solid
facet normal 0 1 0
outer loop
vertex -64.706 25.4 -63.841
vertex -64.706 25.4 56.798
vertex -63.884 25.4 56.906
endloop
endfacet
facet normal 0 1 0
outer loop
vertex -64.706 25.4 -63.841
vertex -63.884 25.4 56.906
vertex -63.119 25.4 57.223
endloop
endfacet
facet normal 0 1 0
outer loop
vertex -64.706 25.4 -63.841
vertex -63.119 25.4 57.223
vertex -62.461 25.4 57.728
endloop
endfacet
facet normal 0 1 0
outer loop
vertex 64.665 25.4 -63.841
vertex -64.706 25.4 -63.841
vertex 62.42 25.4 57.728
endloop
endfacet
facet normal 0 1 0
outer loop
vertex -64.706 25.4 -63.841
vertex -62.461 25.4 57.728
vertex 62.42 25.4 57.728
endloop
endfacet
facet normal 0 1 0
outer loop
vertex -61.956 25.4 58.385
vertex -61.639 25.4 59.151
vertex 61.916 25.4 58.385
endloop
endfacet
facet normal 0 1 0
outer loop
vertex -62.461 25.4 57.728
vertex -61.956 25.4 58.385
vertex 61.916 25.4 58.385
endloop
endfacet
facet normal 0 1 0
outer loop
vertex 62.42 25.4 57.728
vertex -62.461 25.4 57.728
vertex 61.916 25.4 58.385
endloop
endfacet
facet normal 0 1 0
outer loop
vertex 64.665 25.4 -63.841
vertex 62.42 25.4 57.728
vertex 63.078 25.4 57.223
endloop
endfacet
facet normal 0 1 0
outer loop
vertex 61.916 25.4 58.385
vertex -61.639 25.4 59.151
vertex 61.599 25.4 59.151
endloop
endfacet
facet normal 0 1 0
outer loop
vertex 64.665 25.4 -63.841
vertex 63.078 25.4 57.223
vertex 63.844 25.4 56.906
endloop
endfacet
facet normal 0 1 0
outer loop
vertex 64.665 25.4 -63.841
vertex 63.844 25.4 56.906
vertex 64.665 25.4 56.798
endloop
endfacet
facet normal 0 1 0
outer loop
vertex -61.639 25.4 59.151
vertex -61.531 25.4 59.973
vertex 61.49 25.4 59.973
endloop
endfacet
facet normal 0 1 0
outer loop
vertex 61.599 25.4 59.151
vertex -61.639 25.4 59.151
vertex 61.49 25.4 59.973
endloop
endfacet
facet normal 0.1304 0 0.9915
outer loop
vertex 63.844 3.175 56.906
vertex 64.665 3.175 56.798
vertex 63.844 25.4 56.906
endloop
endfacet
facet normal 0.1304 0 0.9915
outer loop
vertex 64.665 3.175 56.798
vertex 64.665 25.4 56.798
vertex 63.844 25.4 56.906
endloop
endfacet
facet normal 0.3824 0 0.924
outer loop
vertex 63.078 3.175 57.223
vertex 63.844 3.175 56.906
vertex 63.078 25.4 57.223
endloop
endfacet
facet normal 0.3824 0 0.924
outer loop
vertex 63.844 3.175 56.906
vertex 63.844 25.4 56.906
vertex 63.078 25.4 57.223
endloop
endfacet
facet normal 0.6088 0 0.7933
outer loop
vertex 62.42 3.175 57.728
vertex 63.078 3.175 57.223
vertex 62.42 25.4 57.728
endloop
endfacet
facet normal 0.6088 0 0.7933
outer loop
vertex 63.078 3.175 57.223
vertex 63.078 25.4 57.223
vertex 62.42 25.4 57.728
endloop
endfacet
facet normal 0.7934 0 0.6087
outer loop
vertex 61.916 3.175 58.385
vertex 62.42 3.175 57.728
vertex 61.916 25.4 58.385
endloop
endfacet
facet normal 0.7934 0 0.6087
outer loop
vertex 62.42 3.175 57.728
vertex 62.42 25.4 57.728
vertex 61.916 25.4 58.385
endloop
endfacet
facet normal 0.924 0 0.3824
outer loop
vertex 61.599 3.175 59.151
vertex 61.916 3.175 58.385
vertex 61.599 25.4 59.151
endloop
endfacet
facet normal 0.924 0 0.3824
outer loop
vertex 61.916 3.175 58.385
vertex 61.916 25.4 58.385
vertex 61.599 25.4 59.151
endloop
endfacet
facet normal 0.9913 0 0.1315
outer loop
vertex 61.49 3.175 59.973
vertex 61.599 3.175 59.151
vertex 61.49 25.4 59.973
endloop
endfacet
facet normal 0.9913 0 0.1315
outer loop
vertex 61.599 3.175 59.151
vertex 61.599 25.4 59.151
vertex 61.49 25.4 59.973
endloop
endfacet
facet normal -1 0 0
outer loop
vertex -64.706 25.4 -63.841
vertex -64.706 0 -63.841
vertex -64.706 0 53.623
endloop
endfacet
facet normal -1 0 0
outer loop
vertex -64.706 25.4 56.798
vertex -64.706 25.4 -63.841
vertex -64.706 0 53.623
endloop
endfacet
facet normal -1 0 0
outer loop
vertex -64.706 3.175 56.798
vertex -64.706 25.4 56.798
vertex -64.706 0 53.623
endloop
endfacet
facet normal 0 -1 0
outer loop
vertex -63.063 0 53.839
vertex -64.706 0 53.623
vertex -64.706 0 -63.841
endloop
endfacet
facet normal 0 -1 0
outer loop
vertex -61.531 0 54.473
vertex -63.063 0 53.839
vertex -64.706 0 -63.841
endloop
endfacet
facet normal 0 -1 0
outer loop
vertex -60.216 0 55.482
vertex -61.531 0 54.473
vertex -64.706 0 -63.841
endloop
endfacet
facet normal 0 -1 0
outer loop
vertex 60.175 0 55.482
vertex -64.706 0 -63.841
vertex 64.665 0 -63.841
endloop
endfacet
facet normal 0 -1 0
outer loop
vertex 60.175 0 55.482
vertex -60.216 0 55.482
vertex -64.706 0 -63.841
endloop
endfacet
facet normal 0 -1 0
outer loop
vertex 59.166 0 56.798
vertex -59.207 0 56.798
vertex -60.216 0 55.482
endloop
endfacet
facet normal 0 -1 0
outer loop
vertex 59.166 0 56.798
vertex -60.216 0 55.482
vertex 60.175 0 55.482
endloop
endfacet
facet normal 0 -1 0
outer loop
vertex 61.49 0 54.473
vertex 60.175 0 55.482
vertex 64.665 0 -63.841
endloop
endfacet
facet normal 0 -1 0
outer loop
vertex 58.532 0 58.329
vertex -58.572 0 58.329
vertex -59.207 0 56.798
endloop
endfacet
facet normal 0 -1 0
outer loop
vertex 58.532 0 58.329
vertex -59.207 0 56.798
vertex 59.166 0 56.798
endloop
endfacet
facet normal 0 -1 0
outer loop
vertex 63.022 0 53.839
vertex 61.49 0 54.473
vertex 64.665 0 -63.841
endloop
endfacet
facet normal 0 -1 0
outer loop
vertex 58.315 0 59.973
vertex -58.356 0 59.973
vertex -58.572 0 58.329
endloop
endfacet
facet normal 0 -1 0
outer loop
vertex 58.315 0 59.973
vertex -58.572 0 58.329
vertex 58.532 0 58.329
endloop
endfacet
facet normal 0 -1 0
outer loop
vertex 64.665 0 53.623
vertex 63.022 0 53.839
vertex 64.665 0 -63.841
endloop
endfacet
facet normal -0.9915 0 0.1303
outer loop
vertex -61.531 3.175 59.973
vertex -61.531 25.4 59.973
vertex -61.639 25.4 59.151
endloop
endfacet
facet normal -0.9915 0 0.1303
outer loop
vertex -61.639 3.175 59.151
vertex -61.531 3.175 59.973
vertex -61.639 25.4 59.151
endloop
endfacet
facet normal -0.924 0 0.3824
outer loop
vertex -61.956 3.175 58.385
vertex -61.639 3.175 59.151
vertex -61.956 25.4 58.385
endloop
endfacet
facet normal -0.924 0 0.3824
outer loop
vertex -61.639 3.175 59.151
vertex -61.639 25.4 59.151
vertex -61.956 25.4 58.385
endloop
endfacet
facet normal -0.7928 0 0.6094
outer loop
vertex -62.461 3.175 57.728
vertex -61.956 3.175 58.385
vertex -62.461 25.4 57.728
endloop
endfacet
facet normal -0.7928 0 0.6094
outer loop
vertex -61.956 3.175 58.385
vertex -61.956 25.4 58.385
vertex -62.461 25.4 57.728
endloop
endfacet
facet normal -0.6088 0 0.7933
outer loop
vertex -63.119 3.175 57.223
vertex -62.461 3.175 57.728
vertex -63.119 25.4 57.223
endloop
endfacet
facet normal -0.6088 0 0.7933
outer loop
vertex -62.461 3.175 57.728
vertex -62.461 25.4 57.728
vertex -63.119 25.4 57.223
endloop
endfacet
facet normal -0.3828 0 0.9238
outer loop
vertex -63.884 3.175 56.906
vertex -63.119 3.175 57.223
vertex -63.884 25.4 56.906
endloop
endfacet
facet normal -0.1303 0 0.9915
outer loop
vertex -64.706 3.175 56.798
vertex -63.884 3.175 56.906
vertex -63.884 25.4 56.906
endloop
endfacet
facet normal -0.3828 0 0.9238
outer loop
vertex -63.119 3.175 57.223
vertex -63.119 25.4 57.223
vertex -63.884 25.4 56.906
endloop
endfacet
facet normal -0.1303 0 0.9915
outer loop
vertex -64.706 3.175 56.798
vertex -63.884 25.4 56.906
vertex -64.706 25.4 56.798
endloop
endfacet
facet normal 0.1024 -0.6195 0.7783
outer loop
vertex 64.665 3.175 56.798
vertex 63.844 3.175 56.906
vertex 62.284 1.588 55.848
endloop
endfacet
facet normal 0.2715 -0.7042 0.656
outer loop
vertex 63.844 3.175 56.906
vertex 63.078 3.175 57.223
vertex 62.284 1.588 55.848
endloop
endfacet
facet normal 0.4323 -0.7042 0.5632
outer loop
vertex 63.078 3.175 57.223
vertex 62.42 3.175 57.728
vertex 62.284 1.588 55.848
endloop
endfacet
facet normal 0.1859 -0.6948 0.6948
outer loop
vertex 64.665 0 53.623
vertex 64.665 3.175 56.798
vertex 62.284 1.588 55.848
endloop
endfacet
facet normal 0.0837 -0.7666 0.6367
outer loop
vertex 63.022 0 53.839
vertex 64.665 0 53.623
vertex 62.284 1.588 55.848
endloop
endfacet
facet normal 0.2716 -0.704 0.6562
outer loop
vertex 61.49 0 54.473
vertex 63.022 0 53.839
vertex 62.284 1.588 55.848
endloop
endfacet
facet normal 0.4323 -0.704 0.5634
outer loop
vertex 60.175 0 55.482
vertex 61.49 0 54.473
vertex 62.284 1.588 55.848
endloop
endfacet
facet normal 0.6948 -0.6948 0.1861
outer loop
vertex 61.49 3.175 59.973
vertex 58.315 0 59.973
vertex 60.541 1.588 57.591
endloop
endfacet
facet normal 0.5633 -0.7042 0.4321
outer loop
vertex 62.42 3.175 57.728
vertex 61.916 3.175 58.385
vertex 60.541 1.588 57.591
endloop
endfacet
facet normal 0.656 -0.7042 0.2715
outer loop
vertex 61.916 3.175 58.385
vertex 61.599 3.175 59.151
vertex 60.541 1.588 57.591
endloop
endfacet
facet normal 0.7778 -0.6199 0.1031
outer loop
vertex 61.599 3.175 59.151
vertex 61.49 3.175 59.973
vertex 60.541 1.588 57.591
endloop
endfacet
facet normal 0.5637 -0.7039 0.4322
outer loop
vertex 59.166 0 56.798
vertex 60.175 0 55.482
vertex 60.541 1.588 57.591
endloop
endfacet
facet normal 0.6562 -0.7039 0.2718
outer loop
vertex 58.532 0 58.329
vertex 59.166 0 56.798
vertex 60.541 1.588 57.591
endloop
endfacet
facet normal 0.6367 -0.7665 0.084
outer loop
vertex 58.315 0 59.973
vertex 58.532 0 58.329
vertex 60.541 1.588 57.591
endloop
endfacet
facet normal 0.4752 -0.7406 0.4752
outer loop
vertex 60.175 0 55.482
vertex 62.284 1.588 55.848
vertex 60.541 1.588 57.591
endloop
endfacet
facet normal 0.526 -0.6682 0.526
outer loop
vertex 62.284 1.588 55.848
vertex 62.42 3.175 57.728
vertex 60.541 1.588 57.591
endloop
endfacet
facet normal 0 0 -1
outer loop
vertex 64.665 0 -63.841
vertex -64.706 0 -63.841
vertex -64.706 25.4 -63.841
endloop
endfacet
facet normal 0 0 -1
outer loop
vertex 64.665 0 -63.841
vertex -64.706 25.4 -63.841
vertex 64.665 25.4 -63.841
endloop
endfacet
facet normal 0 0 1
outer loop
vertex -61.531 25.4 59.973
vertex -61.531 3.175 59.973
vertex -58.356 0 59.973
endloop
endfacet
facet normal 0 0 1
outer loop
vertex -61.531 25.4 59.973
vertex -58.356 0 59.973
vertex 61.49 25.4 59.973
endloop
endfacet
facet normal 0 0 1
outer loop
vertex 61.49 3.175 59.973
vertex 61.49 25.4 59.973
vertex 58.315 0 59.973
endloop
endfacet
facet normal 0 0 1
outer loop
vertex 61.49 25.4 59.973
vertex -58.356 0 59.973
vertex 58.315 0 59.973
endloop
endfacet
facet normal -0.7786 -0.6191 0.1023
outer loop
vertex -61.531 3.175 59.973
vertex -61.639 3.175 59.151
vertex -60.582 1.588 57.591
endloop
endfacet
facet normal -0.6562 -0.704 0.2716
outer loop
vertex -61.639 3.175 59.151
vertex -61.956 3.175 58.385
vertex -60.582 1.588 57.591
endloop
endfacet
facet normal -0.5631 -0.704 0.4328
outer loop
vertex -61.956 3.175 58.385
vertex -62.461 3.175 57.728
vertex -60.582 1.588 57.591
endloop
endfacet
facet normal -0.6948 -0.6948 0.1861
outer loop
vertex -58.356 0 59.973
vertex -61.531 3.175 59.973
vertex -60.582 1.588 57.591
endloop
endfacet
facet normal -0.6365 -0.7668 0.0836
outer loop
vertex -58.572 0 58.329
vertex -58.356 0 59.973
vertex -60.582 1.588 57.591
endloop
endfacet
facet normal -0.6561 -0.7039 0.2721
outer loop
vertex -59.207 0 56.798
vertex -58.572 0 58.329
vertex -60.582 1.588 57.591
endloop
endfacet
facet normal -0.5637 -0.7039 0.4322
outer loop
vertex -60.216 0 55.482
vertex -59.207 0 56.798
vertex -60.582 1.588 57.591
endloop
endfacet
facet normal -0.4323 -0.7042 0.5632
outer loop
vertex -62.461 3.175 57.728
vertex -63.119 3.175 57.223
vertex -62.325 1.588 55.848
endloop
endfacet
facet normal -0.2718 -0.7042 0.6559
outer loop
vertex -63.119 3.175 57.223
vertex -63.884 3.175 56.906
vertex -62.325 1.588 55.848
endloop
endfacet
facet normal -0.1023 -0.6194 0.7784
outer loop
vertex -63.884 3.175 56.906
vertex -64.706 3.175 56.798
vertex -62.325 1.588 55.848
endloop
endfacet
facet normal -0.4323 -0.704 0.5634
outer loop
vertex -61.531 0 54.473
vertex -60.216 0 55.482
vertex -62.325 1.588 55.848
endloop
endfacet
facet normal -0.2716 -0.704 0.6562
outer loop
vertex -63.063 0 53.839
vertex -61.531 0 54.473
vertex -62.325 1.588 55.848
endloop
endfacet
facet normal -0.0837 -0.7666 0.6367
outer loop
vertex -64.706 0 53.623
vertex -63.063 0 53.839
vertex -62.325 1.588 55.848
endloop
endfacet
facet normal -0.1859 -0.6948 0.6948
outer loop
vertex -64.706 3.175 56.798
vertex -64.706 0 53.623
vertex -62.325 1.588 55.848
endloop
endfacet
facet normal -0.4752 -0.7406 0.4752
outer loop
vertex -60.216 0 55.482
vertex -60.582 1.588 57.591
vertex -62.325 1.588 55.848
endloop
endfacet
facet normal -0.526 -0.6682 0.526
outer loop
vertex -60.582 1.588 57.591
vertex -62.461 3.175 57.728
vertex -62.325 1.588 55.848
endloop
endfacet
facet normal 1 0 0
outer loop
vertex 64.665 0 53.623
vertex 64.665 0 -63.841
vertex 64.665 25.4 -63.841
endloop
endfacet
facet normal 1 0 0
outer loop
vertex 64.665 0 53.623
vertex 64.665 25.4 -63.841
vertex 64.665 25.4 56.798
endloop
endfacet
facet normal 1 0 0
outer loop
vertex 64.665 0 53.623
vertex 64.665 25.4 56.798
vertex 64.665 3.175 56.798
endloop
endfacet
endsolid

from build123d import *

# Parameters (mm, degrees)
F1_W           = 129.371486
F1_H           = 123.813696
F2_DEPTH       = 25.4
F3_D           = 6.35
F3_CSINK_D     = 12.7
F3_CSINK_ANGLE = 90


with BuildPart() as f2:
    # F1 (on face) → F2 (new body)
    with BuildSketch(Plane.XZ):
        with Locations((-0.020344, -1.934279)):
            Rectangle(F1_W, F1_H)
    extrude(amount=-F2_DEPTH)

    # F3 (through all)
    with Locations(Plane.XZ):
        with Locations((64.665399, 59.972569), (-64.706087, 59.972569)):
            CounterSinkHole(F3_D / 2, F3_CSINK_D / 2, counter_sink_angle=F3_CSINK_ANGLE)


solid = f2.part
